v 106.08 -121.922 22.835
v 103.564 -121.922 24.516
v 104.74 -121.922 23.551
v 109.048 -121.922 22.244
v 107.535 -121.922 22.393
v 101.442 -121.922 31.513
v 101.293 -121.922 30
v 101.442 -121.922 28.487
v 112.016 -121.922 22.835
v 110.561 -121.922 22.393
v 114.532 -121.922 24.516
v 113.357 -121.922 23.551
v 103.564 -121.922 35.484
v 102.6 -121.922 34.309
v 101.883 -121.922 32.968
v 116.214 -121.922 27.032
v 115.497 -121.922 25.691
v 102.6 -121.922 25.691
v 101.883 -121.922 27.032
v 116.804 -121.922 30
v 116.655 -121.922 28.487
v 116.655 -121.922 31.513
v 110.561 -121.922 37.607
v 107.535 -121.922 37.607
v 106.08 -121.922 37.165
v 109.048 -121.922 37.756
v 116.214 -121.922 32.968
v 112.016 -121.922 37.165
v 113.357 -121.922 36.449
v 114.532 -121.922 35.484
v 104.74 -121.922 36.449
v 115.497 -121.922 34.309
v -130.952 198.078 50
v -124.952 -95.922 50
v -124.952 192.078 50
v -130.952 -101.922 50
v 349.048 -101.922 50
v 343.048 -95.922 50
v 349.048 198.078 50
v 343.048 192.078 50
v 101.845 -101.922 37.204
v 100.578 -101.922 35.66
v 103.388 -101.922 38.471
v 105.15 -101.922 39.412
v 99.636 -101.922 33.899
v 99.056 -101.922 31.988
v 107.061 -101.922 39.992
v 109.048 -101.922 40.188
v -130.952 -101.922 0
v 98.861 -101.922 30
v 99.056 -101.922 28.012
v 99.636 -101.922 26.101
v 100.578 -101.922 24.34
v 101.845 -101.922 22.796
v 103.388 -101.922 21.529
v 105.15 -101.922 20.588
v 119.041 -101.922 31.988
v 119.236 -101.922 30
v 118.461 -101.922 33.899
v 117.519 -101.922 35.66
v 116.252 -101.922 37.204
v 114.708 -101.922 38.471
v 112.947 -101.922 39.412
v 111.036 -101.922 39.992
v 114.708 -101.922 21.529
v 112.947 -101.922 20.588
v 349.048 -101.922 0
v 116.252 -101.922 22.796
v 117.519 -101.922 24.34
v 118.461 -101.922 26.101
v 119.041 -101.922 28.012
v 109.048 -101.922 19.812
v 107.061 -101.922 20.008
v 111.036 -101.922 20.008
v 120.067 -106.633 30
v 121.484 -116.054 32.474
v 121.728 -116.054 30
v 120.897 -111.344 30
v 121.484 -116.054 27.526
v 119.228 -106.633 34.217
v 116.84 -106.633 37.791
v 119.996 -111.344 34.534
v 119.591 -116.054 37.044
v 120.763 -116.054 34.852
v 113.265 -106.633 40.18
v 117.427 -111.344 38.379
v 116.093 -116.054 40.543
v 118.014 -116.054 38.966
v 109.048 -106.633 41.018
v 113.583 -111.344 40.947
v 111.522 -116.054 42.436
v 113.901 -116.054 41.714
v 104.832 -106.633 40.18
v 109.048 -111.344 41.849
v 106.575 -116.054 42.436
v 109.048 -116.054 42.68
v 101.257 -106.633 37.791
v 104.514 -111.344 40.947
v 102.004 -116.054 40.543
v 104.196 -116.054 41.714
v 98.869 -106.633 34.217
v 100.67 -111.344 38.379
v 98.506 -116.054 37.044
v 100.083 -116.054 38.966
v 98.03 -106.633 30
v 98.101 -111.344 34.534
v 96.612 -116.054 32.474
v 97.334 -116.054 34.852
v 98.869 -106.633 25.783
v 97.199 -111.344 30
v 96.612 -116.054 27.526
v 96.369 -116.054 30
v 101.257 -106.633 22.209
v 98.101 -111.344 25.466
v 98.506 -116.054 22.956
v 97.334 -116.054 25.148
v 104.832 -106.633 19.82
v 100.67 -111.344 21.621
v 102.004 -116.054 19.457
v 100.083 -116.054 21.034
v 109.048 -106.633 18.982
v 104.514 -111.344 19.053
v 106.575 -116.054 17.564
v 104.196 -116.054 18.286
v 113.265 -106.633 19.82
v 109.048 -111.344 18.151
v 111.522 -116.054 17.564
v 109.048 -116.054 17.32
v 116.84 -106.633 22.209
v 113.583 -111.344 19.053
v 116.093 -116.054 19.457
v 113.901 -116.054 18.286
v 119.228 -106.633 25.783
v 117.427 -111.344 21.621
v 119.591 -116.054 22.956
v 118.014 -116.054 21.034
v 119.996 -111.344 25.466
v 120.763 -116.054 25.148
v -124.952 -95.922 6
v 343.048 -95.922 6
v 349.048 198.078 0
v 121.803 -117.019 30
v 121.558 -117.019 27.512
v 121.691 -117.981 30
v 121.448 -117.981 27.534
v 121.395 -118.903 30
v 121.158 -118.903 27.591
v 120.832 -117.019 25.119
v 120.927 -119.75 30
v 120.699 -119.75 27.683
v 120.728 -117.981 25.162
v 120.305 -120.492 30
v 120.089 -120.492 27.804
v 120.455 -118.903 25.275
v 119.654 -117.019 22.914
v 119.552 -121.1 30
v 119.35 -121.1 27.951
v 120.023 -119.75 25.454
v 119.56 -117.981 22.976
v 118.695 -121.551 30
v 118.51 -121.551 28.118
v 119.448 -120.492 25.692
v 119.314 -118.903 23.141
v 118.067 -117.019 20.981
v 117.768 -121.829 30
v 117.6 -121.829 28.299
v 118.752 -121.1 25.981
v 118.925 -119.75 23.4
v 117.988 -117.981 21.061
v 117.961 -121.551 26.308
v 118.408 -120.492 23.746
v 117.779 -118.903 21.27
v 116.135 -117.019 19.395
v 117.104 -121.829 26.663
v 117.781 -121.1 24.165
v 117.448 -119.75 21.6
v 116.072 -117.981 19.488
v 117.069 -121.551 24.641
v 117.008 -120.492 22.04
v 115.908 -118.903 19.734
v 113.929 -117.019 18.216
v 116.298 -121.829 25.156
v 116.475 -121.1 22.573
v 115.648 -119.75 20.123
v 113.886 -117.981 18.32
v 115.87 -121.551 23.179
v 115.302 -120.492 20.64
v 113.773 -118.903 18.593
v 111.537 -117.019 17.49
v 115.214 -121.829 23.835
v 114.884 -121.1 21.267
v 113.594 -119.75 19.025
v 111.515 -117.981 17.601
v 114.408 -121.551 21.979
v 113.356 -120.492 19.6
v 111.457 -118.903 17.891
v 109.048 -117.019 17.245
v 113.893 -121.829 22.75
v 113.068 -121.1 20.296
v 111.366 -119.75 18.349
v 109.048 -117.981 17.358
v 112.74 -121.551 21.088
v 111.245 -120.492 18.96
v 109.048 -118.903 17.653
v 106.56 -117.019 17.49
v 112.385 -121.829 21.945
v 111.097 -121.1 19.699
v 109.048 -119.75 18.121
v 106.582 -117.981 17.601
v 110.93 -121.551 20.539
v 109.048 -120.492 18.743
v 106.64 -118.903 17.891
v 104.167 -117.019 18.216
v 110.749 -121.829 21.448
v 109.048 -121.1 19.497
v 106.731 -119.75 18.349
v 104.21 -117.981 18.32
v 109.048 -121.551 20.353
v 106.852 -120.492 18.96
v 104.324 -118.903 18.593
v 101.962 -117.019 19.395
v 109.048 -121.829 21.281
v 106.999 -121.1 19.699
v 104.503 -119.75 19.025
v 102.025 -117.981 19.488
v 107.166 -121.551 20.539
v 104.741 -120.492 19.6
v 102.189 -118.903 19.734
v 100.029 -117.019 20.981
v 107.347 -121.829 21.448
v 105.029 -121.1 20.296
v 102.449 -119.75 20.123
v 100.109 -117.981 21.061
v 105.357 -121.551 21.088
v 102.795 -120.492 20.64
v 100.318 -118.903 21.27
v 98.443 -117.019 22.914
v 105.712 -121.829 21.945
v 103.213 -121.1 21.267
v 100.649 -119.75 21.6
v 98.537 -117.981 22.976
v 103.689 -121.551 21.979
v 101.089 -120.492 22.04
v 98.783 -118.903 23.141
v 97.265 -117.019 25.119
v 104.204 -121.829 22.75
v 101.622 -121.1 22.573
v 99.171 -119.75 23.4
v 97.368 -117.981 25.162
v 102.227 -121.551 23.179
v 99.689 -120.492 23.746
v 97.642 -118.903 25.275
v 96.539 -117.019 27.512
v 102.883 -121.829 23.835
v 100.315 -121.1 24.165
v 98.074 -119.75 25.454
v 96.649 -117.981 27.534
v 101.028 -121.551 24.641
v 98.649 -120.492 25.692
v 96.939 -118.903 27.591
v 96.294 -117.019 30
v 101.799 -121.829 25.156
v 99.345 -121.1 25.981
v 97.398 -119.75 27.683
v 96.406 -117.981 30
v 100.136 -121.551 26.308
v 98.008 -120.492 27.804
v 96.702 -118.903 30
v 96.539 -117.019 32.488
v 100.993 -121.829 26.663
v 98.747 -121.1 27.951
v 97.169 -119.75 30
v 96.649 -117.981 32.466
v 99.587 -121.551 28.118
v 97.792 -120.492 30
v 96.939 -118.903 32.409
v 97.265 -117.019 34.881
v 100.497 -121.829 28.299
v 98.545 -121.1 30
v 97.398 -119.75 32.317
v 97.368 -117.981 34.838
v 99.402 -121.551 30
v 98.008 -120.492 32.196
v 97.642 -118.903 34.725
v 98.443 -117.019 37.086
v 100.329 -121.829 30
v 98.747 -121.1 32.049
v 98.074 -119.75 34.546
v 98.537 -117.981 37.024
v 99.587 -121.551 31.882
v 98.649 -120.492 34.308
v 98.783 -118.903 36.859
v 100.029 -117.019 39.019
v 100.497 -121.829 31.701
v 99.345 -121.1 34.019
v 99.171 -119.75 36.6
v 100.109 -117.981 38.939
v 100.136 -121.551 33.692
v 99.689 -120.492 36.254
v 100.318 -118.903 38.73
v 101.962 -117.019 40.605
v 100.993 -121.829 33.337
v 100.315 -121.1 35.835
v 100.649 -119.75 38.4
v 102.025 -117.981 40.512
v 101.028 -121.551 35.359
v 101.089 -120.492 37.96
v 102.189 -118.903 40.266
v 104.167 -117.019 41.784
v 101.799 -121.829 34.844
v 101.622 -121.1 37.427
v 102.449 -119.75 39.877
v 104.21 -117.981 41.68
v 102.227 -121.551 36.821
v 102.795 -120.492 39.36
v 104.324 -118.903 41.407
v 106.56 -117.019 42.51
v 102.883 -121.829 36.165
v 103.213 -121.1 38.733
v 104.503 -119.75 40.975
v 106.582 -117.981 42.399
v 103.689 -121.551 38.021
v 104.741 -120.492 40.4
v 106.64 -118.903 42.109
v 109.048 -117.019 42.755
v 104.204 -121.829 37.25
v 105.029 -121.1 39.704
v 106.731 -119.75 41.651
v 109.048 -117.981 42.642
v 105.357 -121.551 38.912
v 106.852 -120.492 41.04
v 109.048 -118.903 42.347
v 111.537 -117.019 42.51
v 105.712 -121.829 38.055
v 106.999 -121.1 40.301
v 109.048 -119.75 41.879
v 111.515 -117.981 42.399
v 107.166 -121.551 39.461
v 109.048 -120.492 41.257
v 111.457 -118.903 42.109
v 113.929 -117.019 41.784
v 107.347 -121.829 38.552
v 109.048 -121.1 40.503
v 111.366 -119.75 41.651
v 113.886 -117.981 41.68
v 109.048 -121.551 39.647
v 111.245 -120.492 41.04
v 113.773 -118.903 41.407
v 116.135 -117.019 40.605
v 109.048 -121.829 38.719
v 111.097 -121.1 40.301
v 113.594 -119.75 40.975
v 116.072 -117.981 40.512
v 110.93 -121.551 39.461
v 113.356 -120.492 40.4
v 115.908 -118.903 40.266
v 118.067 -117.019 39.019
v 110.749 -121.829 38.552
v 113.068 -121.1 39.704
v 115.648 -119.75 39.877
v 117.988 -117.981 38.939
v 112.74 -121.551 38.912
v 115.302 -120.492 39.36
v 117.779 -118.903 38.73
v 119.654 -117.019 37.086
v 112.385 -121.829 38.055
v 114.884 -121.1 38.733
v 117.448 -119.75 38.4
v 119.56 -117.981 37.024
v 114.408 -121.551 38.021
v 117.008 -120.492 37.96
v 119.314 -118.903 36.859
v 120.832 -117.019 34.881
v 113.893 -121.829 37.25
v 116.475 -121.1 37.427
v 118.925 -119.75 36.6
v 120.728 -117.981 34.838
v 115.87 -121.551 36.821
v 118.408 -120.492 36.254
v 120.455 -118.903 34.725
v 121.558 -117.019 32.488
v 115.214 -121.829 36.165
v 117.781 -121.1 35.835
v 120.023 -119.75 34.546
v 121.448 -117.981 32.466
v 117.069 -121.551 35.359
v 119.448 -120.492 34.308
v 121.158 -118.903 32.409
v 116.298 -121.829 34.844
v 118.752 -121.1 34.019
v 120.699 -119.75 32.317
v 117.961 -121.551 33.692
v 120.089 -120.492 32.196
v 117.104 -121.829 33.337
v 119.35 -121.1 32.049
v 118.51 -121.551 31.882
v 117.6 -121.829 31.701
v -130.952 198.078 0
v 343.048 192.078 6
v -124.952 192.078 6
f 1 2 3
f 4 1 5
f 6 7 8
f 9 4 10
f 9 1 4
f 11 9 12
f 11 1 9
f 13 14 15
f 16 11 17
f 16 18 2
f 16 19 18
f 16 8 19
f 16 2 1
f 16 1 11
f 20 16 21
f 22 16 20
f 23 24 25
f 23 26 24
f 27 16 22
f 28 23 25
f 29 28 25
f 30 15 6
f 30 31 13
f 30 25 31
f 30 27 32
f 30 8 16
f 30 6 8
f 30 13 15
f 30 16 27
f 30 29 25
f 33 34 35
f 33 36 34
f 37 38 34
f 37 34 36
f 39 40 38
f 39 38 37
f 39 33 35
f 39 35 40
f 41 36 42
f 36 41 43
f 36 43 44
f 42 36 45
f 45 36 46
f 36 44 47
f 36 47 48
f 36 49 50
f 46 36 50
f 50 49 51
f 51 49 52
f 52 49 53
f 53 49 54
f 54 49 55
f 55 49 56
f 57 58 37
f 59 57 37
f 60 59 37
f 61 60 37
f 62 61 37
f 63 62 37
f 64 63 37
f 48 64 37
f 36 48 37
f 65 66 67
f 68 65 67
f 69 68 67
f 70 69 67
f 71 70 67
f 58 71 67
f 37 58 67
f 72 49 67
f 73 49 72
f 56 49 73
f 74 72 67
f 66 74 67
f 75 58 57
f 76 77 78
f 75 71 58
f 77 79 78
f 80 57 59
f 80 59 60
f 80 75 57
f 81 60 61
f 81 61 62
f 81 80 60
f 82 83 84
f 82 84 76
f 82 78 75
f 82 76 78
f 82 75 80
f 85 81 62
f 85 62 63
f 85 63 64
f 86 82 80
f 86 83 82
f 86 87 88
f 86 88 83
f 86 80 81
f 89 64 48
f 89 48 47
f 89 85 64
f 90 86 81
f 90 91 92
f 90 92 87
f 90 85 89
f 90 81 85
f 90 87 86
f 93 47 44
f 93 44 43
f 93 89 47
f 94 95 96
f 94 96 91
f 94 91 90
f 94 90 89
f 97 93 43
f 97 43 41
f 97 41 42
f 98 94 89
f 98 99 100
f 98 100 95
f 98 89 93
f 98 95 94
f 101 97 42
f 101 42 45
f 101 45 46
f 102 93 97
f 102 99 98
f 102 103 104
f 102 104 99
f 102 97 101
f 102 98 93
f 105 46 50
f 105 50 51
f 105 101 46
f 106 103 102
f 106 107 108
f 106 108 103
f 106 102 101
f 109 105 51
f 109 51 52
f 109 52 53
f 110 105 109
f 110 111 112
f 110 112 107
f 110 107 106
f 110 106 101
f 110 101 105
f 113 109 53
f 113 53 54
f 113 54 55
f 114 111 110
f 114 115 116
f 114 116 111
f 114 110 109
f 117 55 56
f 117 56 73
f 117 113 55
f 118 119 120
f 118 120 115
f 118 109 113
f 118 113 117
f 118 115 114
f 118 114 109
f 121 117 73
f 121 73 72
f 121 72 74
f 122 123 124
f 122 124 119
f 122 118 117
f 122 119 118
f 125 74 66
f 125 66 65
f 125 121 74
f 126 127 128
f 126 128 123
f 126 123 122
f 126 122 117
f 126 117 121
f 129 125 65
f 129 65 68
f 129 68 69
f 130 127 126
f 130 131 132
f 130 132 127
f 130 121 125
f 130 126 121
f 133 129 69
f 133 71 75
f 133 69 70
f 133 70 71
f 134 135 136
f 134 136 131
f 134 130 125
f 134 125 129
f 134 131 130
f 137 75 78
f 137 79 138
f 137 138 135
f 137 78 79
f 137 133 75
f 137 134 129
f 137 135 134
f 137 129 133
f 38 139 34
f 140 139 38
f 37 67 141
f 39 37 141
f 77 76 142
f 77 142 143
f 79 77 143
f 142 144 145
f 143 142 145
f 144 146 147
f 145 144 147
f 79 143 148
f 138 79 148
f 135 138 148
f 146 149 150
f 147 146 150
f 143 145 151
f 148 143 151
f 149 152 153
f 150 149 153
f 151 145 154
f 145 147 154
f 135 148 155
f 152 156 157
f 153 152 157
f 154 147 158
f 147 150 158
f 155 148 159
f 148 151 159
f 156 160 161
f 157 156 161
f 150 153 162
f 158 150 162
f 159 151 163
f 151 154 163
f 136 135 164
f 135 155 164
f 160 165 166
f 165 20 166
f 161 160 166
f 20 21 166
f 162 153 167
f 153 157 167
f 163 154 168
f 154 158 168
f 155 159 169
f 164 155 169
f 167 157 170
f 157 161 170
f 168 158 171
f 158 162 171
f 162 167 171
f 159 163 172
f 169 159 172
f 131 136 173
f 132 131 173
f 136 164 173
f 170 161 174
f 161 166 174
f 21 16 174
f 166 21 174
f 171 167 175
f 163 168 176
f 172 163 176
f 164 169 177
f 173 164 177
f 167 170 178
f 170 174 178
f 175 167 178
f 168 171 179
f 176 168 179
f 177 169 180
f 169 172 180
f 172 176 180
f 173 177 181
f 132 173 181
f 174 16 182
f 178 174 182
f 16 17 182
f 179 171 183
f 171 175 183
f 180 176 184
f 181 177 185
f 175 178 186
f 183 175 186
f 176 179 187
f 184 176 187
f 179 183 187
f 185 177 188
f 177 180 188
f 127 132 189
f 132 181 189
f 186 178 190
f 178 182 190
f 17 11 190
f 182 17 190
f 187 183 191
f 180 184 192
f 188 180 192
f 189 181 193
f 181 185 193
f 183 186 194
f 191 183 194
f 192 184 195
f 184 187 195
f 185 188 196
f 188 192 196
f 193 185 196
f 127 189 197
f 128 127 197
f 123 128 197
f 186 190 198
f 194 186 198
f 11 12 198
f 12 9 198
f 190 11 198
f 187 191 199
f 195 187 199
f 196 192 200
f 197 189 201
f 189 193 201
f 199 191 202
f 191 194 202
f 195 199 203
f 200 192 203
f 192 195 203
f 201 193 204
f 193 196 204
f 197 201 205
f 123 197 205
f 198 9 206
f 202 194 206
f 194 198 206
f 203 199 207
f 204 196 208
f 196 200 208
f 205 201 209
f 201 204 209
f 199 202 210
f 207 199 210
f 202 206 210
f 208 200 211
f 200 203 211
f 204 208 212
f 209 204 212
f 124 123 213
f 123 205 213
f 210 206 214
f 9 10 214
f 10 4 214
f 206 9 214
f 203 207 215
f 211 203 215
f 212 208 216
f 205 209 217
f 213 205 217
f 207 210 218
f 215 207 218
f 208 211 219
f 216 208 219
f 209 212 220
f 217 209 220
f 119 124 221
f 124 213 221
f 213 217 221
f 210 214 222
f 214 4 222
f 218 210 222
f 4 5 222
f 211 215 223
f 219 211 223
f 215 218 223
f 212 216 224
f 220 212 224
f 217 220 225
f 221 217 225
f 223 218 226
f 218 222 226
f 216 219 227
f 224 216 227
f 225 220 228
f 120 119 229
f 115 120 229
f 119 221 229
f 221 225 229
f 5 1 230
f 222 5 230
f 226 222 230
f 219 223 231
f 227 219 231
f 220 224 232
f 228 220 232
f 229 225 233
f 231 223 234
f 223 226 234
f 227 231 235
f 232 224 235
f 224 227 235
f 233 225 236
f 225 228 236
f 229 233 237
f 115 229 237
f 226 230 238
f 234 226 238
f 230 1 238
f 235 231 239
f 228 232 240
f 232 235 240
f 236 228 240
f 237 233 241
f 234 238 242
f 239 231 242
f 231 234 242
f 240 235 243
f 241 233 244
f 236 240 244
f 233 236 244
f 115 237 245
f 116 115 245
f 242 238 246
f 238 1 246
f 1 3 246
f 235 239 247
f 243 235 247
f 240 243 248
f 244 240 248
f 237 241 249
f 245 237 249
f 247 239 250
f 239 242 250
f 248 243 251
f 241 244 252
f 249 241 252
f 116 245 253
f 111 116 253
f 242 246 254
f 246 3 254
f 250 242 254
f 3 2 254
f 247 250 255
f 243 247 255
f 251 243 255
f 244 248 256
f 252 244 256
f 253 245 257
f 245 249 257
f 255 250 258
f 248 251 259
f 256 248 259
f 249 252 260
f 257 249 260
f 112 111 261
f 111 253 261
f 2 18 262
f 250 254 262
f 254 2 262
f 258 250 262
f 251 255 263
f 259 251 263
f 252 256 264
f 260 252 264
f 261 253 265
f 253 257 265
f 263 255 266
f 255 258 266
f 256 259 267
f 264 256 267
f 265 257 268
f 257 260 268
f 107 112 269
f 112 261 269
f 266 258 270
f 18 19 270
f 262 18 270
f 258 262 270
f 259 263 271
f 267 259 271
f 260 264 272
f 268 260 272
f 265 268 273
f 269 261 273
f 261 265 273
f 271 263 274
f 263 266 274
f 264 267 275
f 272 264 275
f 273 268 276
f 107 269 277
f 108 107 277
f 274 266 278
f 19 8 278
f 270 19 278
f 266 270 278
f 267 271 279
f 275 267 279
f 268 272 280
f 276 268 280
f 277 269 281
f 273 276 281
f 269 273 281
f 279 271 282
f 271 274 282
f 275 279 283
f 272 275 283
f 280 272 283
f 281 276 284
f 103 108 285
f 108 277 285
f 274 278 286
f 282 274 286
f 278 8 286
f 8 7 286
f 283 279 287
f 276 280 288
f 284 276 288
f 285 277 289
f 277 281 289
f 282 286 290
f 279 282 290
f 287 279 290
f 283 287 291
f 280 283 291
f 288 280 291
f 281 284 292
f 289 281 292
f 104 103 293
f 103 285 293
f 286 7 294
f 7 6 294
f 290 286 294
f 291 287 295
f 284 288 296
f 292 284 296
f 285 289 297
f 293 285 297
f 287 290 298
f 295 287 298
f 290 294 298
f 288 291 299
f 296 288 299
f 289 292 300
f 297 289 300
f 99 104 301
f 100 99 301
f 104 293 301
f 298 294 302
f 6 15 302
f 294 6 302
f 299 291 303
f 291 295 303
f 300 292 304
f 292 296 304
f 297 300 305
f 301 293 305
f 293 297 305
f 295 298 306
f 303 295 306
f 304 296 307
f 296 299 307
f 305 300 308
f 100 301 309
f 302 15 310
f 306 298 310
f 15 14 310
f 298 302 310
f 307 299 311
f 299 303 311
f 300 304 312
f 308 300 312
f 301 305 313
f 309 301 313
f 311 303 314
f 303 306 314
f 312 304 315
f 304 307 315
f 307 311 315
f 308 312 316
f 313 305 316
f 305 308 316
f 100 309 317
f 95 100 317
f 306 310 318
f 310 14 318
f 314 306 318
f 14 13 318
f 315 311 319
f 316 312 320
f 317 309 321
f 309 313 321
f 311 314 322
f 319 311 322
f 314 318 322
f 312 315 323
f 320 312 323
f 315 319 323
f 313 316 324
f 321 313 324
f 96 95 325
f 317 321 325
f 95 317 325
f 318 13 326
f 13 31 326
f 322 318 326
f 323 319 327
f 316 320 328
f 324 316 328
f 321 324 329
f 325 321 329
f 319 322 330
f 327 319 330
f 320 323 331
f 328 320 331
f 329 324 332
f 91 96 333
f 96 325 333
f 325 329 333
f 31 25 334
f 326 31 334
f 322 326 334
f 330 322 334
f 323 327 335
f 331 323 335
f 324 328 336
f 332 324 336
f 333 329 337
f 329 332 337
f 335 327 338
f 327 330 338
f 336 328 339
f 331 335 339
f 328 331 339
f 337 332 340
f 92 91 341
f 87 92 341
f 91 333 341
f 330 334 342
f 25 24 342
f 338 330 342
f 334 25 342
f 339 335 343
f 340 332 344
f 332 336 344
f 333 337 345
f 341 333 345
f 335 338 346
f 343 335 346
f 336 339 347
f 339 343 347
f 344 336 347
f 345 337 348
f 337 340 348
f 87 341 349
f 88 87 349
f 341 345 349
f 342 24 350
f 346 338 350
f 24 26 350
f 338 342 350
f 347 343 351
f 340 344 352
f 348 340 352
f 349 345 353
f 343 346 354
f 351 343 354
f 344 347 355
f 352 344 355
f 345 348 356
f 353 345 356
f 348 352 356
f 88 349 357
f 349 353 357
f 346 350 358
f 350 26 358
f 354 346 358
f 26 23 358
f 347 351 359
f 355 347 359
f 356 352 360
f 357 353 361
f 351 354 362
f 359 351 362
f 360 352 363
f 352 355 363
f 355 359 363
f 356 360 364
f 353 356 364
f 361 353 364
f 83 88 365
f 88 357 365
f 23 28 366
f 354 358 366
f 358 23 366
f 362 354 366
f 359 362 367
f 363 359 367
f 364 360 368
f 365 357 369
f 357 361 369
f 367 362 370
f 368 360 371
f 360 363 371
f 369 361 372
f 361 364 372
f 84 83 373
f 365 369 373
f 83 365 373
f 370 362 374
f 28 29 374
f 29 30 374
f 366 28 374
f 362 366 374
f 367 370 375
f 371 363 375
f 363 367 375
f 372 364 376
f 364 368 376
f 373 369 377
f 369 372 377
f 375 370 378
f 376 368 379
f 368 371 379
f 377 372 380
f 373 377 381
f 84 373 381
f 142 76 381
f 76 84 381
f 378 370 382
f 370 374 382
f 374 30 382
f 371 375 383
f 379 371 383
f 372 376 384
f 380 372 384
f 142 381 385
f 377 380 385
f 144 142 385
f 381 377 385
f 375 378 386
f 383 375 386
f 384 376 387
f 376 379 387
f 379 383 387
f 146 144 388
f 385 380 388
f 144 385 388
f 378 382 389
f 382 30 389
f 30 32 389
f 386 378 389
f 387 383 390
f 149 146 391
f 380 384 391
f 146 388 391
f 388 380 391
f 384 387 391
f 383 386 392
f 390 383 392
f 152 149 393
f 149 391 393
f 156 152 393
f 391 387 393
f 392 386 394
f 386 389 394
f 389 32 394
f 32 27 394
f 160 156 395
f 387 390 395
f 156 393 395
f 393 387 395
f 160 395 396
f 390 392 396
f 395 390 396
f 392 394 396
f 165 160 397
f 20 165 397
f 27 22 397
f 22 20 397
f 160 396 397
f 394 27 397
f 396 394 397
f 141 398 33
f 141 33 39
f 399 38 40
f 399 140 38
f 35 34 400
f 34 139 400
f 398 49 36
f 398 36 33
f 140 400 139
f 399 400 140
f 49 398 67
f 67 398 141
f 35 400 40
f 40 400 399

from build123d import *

# Parameters (mm, degrees)
F0_W     = 480
F0_H     = 300
F1_DEPTH = 50
F2_T     = -6
F3_R     = 10.1878589924
F4_DEPTH = 20
F4_TAPER = -10
F5_R     = 5


with BuildPart() as f1:
    # F0 (on Top) → F1 (new body)
    with BuildSketch(Plane.XY):
        with Locations((109.0484277904, 48.0776532779)):
            Rectangle(F0_W, F0_H)
    extrude(amount=F1_DEPTH)

    # F2
    f2_openings = [f1.faces().sort_by_distance(p)[0] for p in [
        (109.048428, 48.077653, 50),
    ]]
    offset(amount=F2_T, openings=f2_openings)

    # F3 (on face) → F4 (join)
    with BuildSketch(Plane.XZ.offset(101.9223467221)):
        with Locations((109.0484277904, 30)):
            Circle(F3_R)
    extrude(amount=F4_DEPTH, taper=F4_TAPER)

    # F5
    f5_edges = [f1.edges().sort_by_distance(p)[0] for p in [
        (95.334029, -121.922347, 30),
    ]]
    fillet(f5_edges, radius=F5_R)


solid = f1.part
